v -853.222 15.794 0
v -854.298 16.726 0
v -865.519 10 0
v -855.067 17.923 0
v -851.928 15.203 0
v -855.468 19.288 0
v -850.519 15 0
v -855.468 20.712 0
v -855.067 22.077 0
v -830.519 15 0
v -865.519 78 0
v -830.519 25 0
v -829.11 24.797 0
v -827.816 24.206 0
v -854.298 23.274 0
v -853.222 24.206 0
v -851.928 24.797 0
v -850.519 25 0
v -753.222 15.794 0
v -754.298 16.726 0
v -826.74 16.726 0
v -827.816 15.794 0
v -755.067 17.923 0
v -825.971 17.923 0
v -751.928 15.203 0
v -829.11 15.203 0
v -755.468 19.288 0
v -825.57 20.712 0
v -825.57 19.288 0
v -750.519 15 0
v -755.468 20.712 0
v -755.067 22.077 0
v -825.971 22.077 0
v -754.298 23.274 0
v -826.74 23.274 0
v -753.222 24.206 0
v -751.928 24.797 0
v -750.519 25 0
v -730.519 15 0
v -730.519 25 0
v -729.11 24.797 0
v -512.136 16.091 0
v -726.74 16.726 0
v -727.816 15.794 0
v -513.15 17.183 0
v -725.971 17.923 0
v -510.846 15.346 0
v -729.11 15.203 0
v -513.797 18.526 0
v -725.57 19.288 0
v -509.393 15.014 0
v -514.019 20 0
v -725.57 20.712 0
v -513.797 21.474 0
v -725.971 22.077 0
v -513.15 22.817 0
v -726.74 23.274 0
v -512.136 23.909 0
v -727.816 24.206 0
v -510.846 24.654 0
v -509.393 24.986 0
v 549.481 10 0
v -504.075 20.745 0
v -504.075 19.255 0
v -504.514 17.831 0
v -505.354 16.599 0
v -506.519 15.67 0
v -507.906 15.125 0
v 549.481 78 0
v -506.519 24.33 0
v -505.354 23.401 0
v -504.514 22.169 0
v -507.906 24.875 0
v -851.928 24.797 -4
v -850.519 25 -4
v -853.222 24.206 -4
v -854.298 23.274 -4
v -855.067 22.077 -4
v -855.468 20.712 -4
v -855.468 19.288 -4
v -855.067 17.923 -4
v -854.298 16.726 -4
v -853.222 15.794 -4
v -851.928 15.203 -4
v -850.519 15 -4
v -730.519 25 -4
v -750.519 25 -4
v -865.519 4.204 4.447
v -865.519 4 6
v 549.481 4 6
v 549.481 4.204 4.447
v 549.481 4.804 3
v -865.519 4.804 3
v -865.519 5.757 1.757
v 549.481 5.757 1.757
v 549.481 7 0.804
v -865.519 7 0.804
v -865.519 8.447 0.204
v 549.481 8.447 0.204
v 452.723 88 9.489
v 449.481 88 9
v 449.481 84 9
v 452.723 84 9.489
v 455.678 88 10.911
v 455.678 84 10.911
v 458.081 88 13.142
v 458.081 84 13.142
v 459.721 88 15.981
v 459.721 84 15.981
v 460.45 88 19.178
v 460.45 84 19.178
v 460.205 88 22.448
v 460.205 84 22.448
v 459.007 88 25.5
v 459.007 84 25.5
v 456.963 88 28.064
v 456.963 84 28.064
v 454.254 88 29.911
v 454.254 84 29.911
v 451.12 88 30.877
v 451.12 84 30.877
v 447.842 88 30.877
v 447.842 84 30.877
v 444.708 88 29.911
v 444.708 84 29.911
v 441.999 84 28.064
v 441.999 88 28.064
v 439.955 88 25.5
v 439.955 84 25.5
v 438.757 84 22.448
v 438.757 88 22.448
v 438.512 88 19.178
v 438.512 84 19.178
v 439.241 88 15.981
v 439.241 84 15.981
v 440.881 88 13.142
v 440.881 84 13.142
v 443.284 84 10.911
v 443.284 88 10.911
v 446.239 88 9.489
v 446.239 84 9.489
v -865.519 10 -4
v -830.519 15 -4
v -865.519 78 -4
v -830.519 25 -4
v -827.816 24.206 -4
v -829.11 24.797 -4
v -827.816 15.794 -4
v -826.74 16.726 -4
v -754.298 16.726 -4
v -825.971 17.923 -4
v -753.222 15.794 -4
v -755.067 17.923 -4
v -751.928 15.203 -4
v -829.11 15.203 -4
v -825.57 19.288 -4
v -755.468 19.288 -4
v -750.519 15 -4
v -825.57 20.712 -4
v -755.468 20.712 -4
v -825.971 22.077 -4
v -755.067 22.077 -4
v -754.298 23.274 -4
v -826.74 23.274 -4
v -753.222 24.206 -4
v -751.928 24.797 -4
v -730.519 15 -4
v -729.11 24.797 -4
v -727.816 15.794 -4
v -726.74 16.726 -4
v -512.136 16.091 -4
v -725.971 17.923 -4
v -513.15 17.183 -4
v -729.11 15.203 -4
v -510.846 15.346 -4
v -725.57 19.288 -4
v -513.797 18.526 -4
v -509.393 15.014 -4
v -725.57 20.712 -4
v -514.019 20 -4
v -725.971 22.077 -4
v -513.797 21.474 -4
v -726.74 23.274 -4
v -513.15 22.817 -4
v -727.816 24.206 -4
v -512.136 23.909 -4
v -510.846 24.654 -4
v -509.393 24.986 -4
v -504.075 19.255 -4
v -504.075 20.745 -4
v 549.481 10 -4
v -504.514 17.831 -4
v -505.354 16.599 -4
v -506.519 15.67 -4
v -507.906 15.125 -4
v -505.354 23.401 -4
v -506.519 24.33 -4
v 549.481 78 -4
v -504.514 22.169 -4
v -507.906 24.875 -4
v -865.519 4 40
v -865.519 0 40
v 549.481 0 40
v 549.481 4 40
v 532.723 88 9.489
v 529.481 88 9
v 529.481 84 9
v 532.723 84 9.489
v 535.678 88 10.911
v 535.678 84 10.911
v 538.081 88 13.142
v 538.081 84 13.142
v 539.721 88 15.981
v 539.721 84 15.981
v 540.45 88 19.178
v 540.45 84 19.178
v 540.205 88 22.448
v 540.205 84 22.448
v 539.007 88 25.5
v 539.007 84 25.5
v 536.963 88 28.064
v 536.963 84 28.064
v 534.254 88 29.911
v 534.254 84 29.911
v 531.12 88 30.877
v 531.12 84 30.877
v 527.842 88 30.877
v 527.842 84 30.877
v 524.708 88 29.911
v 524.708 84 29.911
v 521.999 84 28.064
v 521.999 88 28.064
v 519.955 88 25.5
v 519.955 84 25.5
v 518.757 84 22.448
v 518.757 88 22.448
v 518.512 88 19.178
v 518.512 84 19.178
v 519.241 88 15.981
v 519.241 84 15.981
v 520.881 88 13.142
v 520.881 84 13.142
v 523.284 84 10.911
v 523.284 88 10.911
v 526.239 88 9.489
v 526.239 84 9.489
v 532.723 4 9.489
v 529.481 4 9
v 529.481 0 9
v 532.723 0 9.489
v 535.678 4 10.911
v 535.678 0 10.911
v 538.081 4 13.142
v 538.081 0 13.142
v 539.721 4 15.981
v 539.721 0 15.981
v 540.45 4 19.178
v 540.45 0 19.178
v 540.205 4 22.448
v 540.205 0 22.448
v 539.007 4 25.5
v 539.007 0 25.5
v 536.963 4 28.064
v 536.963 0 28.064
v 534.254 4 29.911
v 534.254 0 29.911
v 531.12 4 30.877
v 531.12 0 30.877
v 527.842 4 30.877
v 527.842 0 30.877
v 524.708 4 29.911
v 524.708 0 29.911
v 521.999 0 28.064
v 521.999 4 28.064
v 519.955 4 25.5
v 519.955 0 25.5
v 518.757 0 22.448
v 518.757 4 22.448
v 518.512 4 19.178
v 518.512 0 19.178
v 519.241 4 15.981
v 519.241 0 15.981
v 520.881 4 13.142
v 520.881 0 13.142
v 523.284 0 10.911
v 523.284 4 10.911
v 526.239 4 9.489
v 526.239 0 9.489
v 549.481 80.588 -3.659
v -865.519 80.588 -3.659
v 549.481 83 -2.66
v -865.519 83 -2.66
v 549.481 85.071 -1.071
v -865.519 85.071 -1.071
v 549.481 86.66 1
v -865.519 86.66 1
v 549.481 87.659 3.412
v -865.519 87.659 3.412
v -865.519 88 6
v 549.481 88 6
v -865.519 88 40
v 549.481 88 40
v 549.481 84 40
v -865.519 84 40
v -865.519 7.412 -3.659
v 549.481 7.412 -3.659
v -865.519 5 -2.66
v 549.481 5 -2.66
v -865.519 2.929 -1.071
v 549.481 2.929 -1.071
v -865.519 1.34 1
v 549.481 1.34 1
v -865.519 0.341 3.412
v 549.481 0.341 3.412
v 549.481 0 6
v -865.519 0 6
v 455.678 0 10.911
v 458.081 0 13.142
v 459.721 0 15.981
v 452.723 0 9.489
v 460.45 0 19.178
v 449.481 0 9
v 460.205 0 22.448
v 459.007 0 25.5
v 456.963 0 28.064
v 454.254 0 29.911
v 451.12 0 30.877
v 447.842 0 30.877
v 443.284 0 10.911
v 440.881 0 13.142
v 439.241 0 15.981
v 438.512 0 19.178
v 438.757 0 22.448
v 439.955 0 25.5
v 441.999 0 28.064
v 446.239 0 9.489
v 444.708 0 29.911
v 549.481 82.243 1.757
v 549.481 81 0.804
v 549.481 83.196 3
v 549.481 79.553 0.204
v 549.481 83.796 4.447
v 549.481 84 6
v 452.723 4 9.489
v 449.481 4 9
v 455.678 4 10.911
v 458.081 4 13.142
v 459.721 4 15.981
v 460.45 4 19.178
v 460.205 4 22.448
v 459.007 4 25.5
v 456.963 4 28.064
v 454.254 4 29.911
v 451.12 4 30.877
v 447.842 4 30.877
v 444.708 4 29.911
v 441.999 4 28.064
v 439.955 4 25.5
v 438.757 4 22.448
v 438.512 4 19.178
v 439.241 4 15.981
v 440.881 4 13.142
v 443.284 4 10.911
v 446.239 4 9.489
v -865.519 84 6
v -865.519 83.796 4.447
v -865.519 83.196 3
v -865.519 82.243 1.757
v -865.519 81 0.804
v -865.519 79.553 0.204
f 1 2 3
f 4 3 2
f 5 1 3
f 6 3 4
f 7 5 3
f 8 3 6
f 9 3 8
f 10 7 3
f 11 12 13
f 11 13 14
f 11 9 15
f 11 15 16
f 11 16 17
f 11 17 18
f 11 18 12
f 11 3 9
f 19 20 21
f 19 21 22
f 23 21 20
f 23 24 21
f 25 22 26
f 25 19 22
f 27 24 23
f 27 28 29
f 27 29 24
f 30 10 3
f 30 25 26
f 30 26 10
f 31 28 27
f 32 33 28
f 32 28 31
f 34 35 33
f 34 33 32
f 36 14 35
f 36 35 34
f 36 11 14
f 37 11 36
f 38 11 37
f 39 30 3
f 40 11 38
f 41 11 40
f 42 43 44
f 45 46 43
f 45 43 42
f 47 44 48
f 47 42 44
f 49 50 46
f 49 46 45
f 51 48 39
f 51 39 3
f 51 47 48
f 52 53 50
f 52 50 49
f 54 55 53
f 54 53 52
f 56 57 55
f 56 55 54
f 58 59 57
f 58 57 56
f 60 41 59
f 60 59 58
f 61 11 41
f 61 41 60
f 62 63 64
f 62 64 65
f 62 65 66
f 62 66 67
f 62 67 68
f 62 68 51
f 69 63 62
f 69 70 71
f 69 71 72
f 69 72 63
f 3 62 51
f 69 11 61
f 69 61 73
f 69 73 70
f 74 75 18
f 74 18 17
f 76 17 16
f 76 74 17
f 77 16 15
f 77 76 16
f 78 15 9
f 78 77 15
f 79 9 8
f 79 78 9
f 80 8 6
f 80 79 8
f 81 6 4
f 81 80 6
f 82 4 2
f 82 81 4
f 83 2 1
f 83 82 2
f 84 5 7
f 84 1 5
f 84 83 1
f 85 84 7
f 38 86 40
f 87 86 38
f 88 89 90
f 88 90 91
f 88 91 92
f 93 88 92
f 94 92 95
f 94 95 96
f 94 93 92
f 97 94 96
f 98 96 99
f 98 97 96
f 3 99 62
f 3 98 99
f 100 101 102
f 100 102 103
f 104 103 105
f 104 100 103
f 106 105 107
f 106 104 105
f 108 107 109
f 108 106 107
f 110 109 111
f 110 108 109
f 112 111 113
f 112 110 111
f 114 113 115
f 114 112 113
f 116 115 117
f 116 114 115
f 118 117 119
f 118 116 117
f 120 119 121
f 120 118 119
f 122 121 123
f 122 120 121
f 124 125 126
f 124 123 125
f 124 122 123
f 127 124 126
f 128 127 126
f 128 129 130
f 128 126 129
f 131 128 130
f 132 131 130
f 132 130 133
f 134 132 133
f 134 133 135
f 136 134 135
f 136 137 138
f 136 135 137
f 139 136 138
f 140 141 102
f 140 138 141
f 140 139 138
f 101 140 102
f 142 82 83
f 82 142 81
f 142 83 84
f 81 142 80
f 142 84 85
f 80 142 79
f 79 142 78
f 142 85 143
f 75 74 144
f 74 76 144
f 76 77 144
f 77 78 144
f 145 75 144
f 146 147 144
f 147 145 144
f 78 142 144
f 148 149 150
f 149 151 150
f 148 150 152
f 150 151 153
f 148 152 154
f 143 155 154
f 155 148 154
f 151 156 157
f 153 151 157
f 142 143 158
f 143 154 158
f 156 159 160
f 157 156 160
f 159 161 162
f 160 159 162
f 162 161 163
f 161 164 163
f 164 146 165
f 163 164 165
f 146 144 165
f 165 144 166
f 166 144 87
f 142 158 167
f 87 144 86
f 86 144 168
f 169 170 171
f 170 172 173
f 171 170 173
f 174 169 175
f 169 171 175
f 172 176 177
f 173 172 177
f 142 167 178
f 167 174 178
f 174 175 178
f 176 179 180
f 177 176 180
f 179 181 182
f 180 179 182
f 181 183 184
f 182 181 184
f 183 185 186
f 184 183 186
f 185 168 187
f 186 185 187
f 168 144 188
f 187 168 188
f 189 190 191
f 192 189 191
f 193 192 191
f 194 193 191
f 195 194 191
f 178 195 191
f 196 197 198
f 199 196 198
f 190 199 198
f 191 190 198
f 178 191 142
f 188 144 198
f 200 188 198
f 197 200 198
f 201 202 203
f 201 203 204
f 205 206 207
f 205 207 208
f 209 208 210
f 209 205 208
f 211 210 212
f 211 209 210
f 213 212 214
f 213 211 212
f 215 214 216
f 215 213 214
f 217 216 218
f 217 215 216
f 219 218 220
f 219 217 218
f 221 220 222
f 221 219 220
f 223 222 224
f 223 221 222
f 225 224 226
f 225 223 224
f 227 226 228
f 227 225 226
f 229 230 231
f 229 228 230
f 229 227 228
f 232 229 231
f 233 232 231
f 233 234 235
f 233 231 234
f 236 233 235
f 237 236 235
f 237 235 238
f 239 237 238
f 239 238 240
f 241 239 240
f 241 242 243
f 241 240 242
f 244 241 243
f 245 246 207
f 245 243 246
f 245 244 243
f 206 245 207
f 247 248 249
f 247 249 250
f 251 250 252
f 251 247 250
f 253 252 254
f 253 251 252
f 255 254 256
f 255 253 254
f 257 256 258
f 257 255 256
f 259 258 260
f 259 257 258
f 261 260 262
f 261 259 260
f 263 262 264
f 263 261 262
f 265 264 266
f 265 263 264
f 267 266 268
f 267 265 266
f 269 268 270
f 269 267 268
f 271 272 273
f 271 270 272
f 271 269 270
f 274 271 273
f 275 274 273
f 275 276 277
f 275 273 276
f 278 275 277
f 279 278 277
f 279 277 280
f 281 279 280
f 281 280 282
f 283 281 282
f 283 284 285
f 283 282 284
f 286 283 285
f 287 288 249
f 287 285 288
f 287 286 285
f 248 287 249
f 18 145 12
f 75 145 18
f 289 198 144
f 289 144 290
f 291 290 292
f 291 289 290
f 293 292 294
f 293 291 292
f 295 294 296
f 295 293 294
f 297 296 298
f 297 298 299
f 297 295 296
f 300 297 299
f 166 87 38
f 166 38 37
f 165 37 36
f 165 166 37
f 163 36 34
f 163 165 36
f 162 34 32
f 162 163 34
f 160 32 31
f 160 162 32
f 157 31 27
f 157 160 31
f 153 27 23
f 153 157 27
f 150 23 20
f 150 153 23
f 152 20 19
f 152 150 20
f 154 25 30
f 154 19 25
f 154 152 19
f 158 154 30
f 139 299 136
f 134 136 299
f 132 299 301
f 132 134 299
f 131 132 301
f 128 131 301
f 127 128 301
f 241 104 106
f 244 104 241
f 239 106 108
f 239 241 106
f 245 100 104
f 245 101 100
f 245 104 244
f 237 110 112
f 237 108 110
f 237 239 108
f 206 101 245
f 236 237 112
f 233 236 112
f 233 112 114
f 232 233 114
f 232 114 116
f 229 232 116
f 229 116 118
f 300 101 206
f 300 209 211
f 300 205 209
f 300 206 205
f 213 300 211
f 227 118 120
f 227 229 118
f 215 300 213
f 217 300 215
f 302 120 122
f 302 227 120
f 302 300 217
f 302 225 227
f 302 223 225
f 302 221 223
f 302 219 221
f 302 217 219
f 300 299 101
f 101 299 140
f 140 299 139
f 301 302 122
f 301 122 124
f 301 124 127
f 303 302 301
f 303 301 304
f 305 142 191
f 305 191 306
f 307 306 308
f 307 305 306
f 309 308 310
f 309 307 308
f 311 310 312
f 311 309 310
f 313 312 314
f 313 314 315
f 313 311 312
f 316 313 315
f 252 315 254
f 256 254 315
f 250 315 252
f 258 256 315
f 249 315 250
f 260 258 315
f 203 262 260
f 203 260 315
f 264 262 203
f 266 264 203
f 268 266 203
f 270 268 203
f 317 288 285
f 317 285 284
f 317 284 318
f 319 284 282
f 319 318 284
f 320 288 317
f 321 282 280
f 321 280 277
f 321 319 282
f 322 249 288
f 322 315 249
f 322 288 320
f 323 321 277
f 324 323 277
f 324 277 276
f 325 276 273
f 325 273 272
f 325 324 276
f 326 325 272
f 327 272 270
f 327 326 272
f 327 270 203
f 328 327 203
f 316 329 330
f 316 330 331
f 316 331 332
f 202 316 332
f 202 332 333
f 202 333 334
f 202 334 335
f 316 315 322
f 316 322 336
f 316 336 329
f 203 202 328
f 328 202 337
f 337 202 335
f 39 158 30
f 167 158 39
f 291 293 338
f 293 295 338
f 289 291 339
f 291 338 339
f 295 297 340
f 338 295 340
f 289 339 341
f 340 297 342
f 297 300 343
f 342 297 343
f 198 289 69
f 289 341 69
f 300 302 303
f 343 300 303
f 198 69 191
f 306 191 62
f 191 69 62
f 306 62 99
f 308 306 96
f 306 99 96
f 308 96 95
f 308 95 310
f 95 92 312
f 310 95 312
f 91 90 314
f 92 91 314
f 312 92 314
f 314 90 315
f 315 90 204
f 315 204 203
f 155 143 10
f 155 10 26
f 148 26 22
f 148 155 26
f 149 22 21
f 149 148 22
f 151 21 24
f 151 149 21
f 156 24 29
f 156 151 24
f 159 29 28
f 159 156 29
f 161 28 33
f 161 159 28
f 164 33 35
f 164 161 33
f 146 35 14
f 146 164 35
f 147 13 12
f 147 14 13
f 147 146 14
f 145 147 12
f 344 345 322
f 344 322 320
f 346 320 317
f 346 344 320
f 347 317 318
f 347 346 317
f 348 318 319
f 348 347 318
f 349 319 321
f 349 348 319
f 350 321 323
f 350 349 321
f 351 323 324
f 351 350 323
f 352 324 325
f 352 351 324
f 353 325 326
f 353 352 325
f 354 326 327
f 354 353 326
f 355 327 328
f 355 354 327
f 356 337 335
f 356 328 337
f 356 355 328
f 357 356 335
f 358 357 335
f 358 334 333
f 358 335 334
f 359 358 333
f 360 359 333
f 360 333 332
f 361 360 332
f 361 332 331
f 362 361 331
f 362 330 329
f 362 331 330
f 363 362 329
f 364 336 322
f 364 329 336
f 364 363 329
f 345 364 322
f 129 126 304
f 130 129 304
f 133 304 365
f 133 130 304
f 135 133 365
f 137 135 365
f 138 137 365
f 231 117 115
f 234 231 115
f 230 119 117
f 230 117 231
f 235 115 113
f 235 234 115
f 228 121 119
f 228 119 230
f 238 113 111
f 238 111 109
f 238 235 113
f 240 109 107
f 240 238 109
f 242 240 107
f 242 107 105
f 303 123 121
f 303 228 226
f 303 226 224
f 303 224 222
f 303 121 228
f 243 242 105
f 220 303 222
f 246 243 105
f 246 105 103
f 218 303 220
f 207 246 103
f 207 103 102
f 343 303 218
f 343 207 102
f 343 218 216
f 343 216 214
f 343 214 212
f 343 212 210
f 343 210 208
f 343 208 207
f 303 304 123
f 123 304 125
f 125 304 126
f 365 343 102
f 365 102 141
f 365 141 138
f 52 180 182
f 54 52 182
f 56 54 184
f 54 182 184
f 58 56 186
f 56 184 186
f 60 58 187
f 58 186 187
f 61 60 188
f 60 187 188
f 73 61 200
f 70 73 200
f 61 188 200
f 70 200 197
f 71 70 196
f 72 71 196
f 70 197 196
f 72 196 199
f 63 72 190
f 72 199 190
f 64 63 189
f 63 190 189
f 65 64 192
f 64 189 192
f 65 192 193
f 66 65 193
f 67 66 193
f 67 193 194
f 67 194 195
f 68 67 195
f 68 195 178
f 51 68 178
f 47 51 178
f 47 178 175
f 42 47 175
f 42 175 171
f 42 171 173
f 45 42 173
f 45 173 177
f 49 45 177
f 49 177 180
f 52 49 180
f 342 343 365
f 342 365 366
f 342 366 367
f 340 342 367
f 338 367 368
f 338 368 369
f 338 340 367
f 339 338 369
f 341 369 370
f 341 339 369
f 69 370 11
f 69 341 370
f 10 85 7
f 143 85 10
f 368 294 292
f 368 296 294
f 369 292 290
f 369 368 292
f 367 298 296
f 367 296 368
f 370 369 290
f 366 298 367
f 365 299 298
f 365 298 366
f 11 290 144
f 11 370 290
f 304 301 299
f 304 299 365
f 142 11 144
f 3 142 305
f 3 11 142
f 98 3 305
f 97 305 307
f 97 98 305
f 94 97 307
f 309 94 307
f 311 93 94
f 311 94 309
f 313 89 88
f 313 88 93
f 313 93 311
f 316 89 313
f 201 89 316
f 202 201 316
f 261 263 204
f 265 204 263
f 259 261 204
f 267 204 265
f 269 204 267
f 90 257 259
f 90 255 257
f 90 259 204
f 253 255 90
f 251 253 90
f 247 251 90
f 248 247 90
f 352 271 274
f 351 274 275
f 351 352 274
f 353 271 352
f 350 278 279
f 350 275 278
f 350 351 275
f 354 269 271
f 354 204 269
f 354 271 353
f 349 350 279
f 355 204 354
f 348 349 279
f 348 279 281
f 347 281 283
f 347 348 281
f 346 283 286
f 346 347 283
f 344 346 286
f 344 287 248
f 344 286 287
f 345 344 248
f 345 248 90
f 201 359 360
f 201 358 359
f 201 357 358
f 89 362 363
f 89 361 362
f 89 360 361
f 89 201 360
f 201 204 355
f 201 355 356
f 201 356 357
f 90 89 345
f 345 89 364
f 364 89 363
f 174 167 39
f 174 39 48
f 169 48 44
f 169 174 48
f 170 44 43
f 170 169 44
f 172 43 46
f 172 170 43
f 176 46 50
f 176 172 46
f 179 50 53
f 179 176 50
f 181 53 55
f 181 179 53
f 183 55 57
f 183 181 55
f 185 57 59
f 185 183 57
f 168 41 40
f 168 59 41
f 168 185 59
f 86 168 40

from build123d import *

# Parameters (mm, degrees)
SKETCH1_W                    = 1415
SKETCH1_H                    = 88
BASE_FLANGE1_DEPTH           = 4
EDGE_FLANGE1_STRIP_W         = 28
EDGE_FLANGE1_STRIP_H         = 4
EDGE_FLANGE1_STRIP_CUT_DEPTH = 1415
EDGE_FLANGE1_DEPTH           = 1415
EDGE_FLANGE2_STRIP_W         = 28
EDGE_FLANGE2_STRIP_H         = 4
EDGE_FLANGE2_STRIP_CUT_DEPTH = 1415
EDGE_FLANGE2_DEPTH           = 1415
CUT_EXTRUDE1_DEPTH           = 871.900176512
CUT_EXTRUDE1_DEPTH_BACK      = 871.900176512
SKETCH12_R                   = 11
CUT_EXTRUDE2_DEPTH           = 872.093059006
SKETCH16_R                   = 5
CUT_EXTRUDE4_DEPTH           = 10


# Sheet-metal steps are written as plain solids
with BuildPart() as part:
    # Sketch1 → Base-Flange1 (new body)
    with BuildSketch(Plane.XY):
        with Locations((-158.018987342, 44)):
            Rectangle(SKETCH1_W, SKETCH1_H)
    extrude(amount=-BASE_FLANGE1_DEPTH)

    # Edge-Flange1 strip (across the edge) → Edge-Flange1 strip cut (cut)
    with BuildSketch(Plane(origin=(549.481012658, 88, 0), x_dir=(0, -1, 0), z_dir=(-1, 0, 0))):
        with Locations((-4, -2)):
            Rectangle(EDGE_FLANGE1_STRIP_W, EDGE_FLANGE1_STRIP_H)
    extrude(amount=EDGE_FLANGE1_STRIP_CUT_DEPTH, mode=Mode.SUBTRACT)

    # Edge-Flange1 section (across the edge) → Edge-Flange1 (add)
    with BuildSketch(Plane(origin=(549.481012658, 88, 0), x_dir=(0, -1, 0), z_dir=(-1, 0, 0))):
        with BuildLine():
            Line((0, 6), (0, 40))
            Line((0, 40), (4, 40))
            Line((4, 40), (4, 6))
            ThreePointArc((4, 6), (5.757359313, 1.757359313), (10, 0))
            Line((10, 0), (10, -4))
            ThreePointArc((10, -4), (2.928932188, -1.071067812), (0, 6))
        make_face()
    extrude(amount=EDGE_FLANGE1_DEPTH)

    # Edge-Flange2 strip (across the edge) → Edge-Flange2 strip cut (cut)
    with BuildSketch(Plane.YZ.offset(-865.518987342)):
        with Locations((-4, -2)):
            Rectangle(EDGE_FLANGE2_STRIP_W, EDGE_FLANGE2_STRIP_H)
    extrude(amount=EDGE_FLANGE2_STRIP_CUT_DEPTH, mode=Mode.SUBTRACT)

    # Edge-Flange2 section (across the edge) → Edge-Flange2 (add)
    with BuildSketch(Plane.YZ.offset(-865.518987342)):
        with BuildLine():
            Line((0, 6), (0, 40))
            Line((0, 40), (4, 40))
            Line((4, 40), (4, 6))
            ThreePointArc((4, 6), (5.757359313, 1.757359313), (10, 0))
            Line((10, 0), (10, -4))
            ThreePointArc((10, -4), (2.928932188, -1.071067812), (0, 6))
        make_face()
    extrude(amount=EDGE_FLANGE2_DEPTH)

    # Sketch12 → Cut-Extrude1 (cut, two sides: drawn at the far end of the back side and taken through both)
    with BuildSketch(Plane.XZ.offset(-CUT_EXTRUDE1_DEPTH_BACK)):
        with Locations(Location((529.481012658, 20, 0), (0, 0, 270))):
            Circle(SKETCH12_R)
        with Locations(Location((449.481012658, 20, 0), (0, 0, 270))):
            Circle(SKETCH12_R)
    extrude(amount=CUT_EXTRUDE1_DEPTH + CUT_EXTRUDE1_DEPTH_BACK, mode=Mode.SUBTRACT)

    # Sketch13 → Cut-Extrude2 (cut, through all)
    with BuildSketch(Plane(origin=(0, 0, -4), x_dir=(-1, 0, 0), z_dir=(0, 0, -1))):
        with BuildLine():
            Line((850.518987342, 15), (830.518987342, 15))
            ThreePointArc((830.518987342, 15), (825.518987342, 20), (830.518987342, 25))
            Line((830.518987342, 25), (850.518987342, 25))
            ThreePointArc((850.518987342, 25), (855.518987342, 20), (850.518987342, 15))
        make_face()
        with BuildLine():
            Line((750.518987342, 15), (730.518987342, 15))
            ThreePointArc((730.518987342, 15), (725.518987342, 20), (730.518987342, 25))
            Line((730.518987342, 25), (750.518987342, 25))
            ThreePointArc((750.518987342, 25), (755.518987342, 20), (750.518987342, 15))
        make_face()
    extrude(amount=-CUT_EXTRUDE2_DEPTH, mode=Mode.SUBTRACT)

    # Sketch16 → Cut-Extrude4 (cut)
    with BuildSketch(Plane(origin=(0, 0, -4), x_dir=(-1, 0, 0), z_dir=(0, 0, -1))):
        with Locations((509.018987342, 20)):
            Circle(SKETCH16_R)
    extrude(amount=-CUT_EXTRUDE4_DEPTH, mode=Mode.SUBTRACT)


solid = part.part
